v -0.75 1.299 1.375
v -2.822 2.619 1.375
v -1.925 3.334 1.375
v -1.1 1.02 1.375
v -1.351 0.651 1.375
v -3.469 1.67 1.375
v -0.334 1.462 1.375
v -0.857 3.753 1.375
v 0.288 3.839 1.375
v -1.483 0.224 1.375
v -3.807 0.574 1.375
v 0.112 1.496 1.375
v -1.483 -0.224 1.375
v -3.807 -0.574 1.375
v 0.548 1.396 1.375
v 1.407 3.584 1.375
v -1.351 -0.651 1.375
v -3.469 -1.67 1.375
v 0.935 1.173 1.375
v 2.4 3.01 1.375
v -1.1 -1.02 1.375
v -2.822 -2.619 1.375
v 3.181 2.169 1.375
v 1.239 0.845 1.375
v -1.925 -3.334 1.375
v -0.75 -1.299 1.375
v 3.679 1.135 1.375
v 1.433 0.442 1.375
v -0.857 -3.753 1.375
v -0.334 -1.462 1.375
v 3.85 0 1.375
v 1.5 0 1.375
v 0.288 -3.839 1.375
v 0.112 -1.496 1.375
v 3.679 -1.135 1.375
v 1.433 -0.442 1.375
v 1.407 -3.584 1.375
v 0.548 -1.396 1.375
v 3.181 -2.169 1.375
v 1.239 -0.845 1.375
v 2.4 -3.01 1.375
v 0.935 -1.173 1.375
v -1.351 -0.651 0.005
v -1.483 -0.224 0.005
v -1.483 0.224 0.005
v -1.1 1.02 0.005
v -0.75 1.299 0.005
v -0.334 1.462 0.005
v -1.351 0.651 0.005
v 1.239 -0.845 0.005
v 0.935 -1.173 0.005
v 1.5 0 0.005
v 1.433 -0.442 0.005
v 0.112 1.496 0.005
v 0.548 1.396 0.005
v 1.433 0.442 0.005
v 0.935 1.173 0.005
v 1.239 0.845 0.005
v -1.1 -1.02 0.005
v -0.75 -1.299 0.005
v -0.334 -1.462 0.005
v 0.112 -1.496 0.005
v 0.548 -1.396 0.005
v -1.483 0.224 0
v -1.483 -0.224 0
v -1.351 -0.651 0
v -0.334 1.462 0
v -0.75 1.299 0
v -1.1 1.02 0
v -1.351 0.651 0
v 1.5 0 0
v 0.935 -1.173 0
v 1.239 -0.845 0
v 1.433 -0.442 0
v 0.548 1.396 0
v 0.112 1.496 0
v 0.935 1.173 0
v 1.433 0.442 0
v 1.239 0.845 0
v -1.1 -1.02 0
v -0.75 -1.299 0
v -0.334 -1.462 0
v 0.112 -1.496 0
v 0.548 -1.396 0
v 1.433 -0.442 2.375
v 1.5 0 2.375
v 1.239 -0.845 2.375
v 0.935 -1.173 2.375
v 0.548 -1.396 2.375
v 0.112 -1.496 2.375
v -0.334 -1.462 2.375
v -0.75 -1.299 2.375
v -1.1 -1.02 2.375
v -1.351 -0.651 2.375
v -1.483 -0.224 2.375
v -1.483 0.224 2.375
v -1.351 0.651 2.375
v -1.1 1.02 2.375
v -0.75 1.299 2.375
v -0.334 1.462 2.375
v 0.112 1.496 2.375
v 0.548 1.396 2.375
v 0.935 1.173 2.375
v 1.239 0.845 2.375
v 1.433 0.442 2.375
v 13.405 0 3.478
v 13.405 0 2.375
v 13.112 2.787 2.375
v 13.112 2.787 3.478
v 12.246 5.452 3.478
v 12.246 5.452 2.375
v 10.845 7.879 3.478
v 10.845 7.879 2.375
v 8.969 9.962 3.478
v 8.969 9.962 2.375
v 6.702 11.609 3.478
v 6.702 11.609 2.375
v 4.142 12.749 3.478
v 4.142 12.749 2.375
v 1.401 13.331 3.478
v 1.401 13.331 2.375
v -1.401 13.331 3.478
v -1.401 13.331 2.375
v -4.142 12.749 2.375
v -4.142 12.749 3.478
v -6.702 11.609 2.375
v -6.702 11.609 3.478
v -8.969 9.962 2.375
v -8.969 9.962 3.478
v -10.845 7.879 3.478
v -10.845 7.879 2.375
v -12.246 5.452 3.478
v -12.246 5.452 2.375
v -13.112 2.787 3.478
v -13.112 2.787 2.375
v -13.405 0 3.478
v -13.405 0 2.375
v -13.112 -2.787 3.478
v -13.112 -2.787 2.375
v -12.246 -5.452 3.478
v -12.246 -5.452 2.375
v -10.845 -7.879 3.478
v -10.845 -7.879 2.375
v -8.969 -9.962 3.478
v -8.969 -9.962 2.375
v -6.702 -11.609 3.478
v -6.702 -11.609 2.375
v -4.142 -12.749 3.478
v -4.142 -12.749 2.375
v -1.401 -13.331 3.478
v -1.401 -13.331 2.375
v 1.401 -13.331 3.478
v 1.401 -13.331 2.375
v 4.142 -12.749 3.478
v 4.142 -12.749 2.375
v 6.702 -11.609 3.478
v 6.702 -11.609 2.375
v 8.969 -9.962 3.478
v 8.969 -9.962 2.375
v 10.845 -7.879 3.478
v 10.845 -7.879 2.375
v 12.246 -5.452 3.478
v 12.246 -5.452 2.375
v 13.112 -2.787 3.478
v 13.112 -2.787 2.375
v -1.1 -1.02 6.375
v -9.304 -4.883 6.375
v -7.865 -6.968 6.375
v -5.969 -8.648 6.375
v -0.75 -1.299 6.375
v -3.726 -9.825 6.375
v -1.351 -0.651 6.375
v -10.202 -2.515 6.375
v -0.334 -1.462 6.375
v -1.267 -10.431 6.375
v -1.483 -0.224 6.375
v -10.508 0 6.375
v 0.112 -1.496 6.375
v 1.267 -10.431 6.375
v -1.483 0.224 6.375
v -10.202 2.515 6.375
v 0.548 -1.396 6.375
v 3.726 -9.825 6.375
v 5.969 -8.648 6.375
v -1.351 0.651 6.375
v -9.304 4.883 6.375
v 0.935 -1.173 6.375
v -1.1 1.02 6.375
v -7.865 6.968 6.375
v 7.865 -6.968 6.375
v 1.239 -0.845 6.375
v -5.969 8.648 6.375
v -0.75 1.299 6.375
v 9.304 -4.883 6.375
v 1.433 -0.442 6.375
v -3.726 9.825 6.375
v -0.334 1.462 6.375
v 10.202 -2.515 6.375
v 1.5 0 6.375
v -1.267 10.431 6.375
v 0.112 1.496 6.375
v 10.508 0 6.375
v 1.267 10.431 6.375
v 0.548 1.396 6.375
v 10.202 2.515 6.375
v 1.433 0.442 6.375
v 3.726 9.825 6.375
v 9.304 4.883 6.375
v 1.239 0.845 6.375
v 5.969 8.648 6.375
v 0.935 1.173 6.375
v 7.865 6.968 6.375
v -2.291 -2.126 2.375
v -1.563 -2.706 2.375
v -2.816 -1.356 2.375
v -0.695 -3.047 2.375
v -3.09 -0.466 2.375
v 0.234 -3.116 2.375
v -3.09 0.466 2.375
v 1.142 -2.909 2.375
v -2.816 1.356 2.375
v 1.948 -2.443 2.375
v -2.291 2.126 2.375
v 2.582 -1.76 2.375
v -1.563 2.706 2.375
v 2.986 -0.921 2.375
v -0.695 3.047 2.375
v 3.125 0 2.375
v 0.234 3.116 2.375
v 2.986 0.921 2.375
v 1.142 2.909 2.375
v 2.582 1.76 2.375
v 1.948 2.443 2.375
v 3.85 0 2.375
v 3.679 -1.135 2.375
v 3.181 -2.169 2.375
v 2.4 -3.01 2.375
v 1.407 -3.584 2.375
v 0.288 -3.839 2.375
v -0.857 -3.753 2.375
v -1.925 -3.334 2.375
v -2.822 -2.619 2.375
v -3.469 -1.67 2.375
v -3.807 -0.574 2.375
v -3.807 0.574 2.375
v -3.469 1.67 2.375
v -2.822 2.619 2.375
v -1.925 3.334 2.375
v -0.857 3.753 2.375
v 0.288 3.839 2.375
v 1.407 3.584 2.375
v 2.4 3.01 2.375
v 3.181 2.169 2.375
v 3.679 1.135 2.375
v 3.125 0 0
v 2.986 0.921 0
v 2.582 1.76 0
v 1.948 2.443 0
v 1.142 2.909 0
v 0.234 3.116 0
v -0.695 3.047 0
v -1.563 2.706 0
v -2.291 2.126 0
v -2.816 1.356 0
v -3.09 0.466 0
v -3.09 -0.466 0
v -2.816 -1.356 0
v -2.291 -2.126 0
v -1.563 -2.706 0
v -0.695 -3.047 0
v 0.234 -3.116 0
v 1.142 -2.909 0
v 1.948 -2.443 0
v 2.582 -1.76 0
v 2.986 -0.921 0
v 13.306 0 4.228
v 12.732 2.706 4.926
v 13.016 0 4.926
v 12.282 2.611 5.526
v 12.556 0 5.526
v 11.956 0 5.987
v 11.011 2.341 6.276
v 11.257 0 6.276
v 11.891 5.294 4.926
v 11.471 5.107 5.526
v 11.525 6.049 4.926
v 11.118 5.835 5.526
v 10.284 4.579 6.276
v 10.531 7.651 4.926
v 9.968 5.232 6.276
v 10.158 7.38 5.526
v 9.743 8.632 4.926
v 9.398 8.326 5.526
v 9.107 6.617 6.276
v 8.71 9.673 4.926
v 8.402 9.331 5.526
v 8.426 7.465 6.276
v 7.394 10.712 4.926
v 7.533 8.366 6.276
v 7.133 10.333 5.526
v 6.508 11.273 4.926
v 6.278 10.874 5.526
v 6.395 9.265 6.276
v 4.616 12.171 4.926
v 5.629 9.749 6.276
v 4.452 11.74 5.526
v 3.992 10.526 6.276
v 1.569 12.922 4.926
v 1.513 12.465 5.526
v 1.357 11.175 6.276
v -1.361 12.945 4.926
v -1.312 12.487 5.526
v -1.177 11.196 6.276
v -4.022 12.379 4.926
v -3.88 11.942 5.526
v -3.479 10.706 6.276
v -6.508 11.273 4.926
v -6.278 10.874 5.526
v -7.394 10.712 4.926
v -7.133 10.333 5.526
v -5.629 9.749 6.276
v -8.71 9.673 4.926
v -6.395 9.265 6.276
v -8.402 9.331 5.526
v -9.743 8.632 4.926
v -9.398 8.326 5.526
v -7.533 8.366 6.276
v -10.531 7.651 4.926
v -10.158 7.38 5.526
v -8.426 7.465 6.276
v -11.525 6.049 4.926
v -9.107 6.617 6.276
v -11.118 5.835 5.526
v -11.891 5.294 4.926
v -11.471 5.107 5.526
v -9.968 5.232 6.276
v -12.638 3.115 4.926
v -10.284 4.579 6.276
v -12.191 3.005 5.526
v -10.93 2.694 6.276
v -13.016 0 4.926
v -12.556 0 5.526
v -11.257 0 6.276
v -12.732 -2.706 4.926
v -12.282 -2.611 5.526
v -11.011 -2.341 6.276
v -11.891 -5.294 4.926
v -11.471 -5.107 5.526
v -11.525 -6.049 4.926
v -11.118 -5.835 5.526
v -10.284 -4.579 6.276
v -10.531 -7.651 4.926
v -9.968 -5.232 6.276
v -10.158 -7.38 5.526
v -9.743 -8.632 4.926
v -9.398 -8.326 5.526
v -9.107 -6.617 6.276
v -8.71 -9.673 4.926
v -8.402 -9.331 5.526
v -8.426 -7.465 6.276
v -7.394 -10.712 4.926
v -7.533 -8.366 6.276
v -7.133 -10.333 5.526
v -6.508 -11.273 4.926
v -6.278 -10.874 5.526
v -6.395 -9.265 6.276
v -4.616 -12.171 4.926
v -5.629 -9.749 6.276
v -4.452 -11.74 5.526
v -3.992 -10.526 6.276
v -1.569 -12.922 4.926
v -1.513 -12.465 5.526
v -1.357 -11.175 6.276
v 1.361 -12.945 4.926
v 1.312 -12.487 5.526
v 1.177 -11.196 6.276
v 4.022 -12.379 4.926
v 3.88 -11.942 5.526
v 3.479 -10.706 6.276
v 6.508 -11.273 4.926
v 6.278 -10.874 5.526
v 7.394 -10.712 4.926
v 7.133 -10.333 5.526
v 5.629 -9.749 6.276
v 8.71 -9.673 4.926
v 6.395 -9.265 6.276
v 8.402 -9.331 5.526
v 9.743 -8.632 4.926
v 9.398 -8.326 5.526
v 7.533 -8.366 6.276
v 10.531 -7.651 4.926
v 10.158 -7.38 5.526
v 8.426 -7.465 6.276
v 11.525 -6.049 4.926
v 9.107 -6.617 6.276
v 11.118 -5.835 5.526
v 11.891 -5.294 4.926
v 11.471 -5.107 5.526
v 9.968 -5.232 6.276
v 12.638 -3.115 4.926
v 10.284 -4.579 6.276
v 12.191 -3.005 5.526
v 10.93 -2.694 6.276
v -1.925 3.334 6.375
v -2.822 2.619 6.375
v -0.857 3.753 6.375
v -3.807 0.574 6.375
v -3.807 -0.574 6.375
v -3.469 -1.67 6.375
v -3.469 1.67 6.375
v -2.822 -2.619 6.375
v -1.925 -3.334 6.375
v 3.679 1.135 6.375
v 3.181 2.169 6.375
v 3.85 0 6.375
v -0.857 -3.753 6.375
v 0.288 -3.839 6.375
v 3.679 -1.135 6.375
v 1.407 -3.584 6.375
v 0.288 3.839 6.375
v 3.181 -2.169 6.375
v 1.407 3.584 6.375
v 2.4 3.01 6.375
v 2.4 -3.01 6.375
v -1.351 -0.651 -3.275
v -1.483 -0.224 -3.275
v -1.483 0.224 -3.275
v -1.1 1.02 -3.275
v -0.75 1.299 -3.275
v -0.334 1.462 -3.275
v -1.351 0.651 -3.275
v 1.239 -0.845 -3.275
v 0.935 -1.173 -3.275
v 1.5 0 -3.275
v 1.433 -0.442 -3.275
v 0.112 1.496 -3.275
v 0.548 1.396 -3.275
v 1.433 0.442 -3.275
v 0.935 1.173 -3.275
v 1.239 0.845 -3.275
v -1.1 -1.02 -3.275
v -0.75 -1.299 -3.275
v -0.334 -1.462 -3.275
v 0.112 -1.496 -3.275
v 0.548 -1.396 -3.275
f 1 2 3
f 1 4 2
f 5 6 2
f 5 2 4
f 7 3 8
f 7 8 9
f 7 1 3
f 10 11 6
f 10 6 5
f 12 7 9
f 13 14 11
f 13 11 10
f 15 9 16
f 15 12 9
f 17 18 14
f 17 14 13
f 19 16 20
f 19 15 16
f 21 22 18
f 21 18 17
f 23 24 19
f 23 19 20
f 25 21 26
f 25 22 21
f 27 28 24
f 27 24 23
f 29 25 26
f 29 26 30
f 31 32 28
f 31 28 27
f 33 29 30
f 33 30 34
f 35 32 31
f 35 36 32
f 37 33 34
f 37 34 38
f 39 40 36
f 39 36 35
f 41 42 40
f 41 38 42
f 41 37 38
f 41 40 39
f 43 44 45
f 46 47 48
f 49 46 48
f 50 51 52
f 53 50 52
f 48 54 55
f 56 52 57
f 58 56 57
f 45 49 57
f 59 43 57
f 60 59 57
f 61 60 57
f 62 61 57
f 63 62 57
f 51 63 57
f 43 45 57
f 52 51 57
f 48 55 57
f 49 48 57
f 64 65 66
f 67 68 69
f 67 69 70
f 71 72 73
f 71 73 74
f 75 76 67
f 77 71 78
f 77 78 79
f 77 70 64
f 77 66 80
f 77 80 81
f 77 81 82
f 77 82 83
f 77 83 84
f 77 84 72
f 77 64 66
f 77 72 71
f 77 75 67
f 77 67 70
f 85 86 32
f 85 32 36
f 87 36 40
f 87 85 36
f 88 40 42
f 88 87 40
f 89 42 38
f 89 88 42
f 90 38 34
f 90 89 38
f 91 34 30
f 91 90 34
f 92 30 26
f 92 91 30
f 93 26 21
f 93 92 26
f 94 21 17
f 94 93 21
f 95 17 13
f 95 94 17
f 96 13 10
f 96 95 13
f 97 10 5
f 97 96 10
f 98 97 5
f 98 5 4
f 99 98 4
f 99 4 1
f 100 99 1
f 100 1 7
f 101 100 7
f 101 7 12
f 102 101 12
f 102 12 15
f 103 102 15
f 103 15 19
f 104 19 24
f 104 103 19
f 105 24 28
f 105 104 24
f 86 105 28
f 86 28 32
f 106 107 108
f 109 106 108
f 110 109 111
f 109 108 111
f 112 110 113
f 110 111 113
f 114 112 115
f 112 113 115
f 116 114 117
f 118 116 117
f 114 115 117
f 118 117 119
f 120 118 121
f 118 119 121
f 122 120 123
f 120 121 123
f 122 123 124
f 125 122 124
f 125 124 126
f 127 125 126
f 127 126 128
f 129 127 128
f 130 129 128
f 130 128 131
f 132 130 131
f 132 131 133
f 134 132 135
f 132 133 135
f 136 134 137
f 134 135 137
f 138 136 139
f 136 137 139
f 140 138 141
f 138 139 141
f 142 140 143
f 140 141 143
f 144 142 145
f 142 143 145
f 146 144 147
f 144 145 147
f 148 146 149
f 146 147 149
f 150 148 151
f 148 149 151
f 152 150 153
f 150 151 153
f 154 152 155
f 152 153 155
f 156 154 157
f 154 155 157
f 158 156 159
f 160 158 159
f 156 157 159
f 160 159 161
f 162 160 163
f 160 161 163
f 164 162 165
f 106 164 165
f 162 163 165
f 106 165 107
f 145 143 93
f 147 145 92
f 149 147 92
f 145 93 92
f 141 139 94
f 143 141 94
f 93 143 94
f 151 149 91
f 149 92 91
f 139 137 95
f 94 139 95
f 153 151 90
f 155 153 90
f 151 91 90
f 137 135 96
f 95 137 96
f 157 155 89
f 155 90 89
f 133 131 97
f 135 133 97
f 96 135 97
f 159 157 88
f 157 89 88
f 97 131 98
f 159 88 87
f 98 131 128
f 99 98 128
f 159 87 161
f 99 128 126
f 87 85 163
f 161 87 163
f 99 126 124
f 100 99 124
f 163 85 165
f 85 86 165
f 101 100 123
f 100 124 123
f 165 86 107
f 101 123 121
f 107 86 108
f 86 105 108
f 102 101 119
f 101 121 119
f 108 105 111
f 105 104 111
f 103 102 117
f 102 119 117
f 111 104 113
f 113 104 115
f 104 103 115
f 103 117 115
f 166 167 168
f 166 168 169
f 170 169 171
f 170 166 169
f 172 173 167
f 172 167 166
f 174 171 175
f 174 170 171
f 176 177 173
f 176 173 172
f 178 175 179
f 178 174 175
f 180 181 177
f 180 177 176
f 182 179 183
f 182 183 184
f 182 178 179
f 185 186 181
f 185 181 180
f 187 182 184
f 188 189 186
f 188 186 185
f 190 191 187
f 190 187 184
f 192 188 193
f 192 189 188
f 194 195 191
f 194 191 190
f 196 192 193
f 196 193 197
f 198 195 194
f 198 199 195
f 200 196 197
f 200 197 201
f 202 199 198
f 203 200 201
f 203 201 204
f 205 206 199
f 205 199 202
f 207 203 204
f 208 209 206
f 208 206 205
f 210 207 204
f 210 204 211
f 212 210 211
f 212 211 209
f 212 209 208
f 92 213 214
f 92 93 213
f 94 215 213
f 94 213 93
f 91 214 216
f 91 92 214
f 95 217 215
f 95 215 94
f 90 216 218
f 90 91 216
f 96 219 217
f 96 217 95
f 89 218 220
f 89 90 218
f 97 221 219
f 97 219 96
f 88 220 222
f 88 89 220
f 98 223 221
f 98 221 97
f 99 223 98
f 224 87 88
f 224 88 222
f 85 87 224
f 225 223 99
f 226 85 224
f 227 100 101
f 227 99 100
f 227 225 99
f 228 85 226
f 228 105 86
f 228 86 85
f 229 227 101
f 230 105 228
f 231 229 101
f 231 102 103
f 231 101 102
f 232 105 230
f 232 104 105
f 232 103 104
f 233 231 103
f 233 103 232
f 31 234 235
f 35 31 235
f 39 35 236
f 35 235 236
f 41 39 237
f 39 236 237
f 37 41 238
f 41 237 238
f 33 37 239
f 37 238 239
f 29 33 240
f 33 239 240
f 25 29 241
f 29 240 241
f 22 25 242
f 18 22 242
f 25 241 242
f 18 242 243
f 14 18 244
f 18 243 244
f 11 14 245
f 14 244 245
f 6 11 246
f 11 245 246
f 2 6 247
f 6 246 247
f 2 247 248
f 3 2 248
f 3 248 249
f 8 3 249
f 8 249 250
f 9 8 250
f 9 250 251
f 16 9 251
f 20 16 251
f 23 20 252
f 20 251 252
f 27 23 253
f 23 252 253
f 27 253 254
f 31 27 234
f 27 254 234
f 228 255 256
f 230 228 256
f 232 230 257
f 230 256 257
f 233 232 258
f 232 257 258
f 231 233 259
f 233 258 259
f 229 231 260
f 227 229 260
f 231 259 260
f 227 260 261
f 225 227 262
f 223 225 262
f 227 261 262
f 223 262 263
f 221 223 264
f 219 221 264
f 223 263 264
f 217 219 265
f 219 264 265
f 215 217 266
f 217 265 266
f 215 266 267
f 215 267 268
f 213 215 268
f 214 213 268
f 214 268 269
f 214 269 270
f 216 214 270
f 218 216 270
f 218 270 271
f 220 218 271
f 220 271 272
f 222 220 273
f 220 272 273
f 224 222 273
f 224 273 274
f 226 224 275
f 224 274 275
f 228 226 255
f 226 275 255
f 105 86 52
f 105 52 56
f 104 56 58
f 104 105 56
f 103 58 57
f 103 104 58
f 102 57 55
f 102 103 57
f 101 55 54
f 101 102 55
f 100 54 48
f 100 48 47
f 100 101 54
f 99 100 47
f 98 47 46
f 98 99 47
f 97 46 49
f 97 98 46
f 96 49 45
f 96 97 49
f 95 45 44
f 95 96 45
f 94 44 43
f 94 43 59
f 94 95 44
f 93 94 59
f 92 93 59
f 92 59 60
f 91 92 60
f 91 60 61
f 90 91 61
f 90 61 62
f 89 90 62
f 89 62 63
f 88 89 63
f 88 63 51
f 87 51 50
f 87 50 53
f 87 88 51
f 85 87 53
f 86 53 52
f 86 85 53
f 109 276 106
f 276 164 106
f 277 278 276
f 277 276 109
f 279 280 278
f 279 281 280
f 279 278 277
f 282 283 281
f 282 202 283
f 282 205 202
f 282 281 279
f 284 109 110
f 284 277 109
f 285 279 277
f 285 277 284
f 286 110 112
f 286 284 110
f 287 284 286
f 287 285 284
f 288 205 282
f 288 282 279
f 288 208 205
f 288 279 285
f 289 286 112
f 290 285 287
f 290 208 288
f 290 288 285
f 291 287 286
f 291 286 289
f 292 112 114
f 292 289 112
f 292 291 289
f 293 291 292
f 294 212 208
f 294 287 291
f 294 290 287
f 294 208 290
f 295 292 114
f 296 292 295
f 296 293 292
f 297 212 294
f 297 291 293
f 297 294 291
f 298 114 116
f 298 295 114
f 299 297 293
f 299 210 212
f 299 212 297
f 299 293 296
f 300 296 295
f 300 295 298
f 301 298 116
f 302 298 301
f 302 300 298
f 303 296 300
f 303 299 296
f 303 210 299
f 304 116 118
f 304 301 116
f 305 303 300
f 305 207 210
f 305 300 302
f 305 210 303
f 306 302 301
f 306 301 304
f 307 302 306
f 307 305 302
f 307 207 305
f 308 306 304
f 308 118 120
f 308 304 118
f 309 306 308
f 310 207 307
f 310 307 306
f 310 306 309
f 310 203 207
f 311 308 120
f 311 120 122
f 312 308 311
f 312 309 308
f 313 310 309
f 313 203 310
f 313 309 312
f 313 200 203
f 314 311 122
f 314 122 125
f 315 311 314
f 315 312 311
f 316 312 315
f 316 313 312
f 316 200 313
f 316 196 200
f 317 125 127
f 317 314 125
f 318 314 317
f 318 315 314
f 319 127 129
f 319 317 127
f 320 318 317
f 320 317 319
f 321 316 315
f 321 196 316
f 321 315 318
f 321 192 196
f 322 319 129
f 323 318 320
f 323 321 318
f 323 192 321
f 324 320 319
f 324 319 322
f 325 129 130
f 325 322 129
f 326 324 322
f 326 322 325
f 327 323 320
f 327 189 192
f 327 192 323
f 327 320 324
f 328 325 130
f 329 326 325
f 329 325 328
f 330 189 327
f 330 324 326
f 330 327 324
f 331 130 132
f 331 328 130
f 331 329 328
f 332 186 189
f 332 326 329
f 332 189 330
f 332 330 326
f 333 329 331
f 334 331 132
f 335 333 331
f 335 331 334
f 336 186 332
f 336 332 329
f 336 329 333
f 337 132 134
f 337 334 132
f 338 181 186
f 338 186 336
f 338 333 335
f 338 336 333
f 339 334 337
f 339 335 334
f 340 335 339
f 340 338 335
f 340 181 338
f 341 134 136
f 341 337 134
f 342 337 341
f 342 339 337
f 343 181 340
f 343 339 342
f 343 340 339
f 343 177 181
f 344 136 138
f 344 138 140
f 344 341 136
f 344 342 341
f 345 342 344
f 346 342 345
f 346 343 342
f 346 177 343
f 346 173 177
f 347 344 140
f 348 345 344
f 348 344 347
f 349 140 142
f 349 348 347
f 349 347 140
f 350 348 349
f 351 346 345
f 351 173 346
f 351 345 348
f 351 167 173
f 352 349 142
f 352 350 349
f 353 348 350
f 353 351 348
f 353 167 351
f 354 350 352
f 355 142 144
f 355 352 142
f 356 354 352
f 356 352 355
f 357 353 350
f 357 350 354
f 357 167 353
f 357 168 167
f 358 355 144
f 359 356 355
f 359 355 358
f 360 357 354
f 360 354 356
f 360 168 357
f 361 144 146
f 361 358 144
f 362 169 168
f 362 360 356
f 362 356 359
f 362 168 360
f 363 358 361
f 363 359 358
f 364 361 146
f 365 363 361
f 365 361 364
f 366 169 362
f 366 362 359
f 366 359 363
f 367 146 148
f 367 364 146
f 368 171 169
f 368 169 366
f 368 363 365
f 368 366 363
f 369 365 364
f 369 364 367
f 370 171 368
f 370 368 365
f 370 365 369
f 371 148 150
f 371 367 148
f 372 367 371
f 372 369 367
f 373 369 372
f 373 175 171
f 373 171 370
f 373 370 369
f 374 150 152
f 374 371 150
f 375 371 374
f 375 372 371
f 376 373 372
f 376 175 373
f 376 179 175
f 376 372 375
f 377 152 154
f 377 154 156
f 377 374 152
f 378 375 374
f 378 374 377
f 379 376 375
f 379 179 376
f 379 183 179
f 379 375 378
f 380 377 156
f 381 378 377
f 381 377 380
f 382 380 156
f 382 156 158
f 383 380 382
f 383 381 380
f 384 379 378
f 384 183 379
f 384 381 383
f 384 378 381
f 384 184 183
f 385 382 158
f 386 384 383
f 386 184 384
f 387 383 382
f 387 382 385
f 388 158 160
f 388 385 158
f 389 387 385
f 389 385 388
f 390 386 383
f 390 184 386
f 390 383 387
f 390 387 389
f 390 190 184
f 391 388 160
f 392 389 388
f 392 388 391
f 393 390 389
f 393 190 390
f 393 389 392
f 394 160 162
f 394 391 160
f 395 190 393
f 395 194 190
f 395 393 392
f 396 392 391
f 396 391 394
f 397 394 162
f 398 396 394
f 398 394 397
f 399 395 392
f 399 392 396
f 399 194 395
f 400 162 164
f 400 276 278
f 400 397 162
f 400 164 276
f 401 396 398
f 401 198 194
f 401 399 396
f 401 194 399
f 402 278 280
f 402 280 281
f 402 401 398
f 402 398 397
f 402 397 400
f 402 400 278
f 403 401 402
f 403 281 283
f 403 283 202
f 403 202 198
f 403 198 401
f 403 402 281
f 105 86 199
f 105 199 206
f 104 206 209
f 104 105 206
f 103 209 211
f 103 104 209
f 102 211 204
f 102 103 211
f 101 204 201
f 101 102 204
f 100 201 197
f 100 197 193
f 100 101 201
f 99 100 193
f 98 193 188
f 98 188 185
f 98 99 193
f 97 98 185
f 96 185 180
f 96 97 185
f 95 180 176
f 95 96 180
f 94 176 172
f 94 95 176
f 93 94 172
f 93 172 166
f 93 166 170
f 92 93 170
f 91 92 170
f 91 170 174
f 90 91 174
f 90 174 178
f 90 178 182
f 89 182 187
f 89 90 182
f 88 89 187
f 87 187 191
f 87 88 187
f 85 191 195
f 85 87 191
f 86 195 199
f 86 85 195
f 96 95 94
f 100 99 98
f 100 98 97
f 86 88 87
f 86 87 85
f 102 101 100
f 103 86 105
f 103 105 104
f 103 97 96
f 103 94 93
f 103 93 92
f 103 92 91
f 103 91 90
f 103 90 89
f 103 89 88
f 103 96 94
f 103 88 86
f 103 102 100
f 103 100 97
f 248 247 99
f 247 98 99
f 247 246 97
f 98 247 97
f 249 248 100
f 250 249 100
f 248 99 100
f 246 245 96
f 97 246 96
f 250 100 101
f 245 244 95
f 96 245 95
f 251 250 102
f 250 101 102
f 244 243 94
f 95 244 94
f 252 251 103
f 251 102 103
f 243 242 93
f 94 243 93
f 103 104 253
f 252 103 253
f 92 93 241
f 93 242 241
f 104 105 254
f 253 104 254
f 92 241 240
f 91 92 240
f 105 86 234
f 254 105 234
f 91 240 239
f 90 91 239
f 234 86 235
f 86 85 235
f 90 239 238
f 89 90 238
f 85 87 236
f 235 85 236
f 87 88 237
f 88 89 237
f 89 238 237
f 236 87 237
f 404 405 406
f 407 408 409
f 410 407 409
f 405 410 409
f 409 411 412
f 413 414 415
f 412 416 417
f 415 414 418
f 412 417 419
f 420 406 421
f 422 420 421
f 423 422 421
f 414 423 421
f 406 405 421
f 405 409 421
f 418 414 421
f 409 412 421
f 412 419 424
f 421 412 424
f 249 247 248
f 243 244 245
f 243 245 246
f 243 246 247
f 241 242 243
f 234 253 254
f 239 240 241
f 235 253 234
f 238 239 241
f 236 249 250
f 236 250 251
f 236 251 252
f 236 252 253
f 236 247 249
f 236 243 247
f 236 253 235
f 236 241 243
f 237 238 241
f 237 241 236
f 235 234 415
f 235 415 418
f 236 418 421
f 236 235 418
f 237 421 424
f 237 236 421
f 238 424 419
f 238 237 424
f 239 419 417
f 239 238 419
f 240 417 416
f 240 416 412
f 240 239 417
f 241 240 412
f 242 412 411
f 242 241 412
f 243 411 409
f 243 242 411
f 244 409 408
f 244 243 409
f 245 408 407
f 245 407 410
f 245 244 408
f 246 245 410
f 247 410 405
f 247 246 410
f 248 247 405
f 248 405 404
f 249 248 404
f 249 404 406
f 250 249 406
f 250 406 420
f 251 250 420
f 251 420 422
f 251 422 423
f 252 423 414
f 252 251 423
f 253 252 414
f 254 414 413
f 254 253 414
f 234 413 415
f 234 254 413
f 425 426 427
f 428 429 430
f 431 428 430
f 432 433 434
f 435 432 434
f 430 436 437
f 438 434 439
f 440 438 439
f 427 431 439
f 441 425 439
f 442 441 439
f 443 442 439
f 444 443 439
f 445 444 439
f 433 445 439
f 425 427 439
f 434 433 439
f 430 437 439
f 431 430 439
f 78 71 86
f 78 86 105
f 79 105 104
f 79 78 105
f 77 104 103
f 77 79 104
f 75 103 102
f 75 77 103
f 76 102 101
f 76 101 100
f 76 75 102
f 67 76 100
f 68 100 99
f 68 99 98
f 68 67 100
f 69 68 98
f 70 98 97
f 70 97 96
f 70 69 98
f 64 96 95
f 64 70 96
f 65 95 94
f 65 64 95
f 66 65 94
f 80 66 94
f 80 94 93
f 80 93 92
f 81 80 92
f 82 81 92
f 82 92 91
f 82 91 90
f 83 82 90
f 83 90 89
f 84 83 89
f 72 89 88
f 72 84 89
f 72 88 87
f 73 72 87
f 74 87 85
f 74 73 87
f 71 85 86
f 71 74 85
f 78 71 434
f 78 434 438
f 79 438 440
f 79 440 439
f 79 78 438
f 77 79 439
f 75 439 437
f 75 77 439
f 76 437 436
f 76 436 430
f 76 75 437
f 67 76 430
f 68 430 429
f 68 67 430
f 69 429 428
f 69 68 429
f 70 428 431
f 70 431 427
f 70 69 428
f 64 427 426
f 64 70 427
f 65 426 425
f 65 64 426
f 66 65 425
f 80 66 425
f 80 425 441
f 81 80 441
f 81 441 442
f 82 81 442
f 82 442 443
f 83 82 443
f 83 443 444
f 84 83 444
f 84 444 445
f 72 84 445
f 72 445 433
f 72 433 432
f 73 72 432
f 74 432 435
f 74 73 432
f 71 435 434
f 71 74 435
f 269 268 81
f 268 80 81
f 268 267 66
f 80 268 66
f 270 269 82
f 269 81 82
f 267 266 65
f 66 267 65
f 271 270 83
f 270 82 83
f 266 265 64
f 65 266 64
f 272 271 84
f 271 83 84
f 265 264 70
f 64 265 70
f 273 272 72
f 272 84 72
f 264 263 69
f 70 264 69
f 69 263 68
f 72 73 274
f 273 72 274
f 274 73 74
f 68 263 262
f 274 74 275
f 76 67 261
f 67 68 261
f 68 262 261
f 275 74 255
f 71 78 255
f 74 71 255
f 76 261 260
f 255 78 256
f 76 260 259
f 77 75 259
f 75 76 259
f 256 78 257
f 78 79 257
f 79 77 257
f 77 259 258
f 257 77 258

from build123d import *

# Parameters (mm, degrees)
F0_R     = 3.125
F0_R_2   = 1.5
F1_DEPTH = 2.375
F2_R     = 13.404584
F2_R_2   = 3.125
F2_R_3   = 1.5
F3_DEPTH = 4
F4_R     = 2.897056
F5_R     = 3.85
F5_R_2   = 1.5
F6_DEPTH = 1
F7_DEPTH = 4
F8_DEPTH = 2.37
F9_DEPTH = 3.275


with BuildPart() as f1:
    # F0 (on Top) → F1 (new body)
    with BuildSketch(Plane.XY):
        Circle(F0_R)
        Circle(F0_R_2, mode=Mode.SUBTRACT)
    extrude(amount=F1_DEPTH)


with BuildPart() as f3:
    # F2 (on face) → F3 (new body)
    with BuildSketch(Plane.XY.offset(2.375)):
        Circle(F2_R)
        Circle(F2_R_2, mode=Mode.SUBTRACT)
        Circle(F2_R_2)
        Circle(F2_R_3, mode=Mode.SUBTRACT)
    extrude(amount=F3_DEPTH)

    # F4
    f4_edges = [f3.edges().sort_by_distance(p)[0] for p in [
        (-13.404584, 0, 6.375),
    ]]
    fillet(f4_edges, radius=F4_R)


with BuildPart() as f6:
    # F5 (on face) → F6 (new body)
    with BuildSketch(Plane(origin=(0, 0, 2.375), x_dir=(1, 0, 0), z_dir=(0, 0, -1))):
        Circle(F5_R)
        Circle(F5_R_2, mode=Mode.SUBTRACT)
    extrude(amount=F6_DEPTH)


with BuildPart() as f7:
    # F5 (on face) → F7 (new body)
    with BuildSketch(Plane(origin=(0, 0, 2.375), x_dir=(1, 0, 0), z_dir=(0, 0, -1))):
        Circle(F5_R)
    extrude(amount=-F7_DEPTH)


with BuildPart() as f8:
    # F2 (on face) → F8 (new body)
    with BuildSketch(Plane.XY.offset(2.375)):
        Circle(F2_R_3)
    extrude(amount=-F8_DEPTH)


with BuildPart() as f9:
    # F0 (on Top) → F9 (new body)
    with BuildSketch(Plane.XY):
        Circle(F0_R_2)
    extrude(amount=-F9_DEPTH)


solid = Compound([f1.part, f3.part, f6.part, f7.part, f8.part, f9.part])
